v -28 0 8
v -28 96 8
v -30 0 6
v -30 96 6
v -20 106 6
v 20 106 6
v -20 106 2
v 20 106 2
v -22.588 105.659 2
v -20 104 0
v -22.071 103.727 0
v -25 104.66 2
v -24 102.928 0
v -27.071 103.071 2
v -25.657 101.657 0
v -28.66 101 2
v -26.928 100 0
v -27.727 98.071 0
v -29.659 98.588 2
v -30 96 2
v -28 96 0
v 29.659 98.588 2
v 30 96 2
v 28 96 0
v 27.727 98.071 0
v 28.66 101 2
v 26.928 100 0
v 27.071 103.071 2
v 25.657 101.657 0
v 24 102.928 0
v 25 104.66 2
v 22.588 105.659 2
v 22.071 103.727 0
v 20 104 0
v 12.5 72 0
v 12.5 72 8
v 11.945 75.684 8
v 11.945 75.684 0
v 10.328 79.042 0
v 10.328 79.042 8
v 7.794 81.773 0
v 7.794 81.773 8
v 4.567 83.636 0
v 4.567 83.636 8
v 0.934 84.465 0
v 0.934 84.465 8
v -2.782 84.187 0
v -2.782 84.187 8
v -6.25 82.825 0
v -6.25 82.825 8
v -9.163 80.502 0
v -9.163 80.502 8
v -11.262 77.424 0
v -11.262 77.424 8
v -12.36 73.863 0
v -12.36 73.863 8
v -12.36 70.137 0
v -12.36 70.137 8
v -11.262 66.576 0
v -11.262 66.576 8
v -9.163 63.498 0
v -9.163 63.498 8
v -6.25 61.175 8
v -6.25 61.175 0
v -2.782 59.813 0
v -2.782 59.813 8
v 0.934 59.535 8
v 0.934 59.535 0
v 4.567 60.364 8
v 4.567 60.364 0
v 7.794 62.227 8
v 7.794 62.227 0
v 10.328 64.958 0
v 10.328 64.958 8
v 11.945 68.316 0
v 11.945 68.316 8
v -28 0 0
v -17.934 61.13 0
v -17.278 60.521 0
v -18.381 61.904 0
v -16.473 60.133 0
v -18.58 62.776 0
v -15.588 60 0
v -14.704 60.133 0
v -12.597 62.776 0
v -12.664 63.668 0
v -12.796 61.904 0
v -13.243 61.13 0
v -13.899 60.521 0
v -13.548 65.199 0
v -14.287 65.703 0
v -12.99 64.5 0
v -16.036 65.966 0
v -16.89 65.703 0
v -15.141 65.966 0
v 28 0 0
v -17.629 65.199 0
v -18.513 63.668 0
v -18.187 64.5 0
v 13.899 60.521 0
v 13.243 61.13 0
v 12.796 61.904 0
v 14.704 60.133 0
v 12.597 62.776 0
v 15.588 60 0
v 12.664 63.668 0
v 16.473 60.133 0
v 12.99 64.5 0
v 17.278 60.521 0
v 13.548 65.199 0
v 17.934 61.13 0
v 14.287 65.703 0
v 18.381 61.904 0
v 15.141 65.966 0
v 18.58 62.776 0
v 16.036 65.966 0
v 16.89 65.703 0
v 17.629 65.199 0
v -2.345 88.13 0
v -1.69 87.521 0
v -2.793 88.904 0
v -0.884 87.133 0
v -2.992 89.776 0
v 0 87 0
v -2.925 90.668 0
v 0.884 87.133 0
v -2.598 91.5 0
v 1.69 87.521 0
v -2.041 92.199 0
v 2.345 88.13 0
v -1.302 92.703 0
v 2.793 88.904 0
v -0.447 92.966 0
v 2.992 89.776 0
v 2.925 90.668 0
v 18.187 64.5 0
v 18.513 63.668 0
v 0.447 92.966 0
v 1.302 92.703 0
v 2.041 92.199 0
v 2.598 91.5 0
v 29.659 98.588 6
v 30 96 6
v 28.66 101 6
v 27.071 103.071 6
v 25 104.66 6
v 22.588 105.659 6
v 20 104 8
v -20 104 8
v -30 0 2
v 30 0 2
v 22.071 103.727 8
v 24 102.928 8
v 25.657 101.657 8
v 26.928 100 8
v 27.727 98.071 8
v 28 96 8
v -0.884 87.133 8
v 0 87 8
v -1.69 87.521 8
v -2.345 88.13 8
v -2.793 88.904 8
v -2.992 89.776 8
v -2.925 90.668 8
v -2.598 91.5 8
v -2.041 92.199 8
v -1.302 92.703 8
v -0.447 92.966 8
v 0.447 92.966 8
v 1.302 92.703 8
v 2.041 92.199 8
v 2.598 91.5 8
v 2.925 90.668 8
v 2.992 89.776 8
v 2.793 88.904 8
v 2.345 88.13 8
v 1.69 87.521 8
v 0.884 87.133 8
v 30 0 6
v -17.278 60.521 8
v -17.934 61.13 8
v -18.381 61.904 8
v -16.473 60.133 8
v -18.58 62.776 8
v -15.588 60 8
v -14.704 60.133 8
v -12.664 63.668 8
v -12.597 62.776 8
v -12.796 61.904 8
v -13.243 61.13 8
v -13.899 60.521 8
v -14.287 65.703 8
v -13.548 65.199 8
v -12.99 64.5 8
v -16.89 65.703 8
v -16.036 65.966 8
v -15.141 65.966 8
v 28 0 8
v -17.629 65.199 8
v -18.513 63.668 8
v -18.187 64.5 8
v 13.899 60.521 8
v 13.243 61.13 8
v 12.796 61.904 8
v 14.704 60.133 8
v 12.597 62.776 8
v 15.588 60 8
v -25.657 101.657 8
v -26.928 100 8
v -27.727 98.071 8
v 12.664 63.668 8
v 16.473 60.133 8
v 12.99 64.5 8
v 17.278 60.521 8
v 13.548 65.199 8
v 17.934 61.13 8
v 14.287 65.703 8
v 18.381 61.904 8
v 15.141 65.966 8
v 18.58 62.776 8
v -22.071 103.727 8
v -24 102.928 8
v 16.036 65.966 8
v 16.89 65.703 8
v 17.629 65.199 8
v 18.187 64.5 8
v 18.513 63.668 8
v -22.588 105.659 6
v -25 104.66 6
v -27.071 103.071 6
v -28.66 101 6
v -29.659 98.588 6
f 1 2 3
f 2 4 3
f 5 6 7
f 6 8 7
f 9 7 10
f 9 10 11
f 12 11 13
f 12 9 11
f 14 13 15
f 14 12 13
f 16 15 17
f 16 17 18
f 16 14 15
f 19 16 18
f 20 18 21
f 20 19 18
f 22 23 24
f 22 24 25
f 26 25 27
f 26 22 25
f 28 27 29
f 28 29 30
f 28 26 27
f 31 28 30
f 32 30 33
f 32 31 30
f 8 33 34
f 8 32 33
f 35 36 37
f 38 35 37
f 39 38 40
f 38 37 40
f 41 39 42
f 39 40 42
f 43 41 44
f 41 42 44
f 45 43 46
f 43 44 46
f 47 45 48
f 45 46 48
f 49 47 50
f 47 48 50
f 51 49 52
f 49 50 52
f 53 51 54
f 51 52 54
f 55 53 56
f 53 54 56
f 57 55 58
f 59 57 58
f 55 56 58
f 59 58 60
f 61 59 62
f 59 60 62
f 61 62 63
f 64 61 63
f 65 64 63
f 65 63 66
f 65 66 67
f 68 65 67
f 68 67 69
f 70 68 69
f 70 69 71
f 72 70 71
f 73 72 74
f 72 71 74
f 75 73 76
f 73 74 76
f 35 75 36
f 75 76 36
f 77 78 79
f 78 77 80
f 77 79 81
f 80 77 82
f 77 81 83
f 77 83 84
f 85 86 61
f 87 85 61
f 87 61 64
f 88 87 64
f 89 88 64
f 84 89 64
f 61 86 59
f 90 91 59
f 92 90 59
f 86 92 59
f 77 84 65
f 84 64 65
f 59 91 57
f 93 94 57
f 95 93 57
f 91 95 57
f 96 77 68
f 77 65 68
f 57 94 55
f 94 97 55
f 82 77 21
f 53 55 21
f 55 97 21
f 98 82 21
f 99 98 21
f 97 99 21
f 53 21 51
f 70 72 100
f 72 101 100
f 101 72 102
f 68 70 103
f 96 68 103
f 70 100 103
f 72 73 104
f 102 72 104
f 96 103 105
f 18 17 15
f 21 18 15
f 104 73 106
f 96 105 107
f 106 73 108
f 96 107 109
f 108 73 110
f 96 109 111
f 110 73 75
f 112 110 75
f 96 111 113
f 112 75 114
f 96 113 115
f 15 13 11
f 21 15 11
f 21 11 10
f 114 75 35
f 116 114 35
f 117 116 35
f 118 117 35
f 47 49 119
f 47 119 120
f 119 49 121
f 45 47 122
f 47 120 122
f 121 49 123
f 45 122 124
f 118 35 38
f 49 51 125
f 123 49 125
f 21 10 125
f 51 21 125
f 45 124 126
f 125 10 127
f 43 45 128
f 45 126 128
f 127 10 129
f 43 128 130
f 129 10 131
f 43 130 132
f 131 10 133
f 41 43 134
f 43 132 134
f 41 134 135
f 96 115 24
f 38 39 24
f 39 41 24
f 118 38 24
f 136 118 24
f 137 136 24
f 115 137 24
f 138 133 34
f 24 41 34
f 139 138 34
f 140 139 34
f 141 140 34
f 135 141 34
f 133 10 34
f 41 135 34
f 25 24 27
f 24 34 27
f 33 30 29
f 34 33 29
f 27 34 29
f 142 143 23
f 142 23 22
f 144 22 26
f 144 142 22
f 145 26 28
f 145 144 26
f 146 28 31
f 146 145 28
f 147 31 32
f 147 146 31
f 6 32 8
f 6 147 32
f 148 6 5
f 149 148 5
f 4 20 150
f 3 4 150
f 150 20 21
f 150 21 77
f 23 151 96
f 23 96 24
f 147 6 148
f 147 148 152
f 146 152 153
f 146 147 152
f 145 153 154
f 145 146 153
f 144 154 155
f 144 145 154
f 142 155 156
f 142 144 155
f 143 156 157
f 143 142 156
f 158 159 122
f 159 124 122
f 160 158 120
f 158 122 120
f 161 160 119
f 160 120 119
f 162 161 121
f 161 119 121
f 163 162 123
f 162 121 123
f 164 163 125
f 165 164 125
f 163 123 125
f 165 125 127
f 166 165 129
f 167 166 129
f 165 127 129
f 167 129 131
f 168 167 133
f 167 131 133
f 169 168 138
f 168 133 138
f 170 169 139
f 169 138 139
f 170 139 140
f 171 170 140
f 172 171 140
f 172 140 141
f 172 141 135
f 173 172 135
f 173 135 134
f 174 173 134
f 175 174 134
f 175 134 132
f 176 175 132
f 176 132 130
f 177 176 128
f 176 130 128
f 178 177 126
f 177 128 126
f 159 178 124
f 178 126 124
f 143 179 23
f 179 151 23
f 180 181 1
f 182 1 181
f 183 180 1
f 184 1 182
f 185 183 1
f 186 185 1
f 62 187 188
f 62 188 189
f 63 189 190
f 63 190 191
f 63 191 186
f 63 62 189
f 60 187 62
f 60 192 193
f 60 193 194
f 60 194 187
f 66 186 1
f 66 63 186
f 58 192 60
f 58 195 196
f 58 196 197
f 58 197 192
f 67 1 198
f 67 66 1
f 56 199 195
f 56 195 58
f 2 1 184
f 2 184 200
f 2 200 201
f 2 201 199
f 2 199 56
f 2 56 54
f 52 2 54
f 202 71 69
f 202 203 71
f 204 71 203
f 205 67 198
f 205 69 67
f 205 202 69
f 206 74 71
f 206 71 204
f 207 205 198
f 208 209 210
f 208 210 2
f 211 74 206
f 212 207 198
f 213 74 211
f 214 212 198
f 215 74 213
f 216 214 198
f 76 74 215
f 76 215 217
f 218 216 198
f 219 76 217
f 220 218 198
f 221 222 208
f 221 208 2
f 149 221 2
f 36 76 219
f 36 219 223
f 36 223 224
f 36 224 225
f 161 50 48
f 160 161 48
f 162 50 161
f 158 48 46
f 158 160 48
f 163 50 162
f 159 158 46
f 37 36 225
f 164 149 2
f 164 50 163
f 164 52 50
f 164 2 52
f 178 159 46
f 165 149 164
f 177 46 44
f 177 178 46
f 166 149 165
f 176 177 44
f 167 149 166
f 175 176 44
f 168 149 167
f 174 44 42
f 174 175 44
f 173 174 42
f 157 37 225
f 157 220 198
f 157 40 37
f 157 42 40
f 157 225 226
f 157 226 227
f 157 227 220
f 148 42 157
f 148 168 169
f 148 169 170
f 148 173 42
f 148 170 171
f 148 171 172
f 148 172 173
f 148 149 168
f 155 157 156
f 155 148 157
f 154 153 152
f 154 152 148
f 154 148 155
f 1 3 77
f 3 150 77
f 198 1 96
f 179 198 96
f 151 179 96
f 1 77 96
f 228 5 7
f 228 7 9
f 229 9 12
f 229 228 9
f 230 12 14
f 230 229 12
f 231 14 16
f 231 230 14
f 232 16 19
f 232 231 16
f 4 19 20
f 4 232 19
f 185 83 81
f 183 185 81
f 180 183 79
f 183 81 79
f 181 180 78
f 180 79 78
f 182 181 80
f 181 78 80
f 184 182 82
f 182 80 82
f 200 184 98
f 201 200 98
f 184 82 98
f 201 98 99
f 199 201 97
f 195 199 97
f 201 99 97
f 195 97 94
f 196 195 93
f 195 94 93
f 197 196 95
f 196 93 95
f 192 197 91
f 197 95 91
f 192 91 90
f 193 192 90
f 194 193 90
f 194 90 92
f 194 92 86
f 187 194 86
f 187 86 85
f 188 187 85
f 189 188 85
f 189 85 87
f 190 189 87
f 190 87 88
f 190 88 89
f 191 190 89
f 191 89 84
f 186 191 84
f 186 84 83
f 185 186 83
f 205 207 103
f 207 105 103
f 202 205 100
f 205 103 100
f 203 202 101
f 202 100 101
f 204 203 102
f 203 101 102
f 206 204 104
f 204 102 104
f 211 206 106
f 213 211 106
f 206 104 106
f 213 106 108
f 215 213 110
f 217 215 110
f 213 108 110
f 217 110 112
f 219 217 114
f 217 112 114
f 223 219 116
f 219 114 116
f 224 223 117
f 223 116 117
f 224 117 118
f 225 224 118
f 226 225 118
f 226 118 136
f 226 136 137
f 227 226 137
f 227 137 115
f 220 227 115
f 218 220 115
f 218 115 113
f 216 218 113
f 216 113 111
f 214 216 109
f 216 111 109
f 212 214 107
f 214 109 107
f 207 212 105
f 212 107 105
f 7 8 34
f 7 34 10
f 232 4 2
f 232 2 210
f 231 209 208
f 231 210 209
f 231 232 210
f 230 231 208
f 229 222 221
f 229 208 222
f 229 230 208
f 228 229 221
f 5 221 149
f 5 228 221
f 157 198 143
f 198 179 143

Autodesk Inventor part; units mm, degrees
ref_plane "YZ Plane" through (0, 0, 0) normal (1, 0, 0) x (0, 1, 0)
ref_plane "XZ Plane" through (0, 0, 0) normal (0, 1, 0) x (-1, 0, 0)
ref_plane "XY Plane" through (0, 0, 0) normal (0, 0, 1) x (1, 0, 0)
sketch "Sketch1" plane through (0, 0, 0) normal (0, 0, 1) x (1, 0, 0)
  line L0 (-30, 0) -> (30, 0)
  line L1 (30, 0) -> (30, 106)
  line L2 (30, 106) -> (-30, 106)
  line L3 (-30, 106) -> (-30, 0)
  point P0 (0, 0)
  dimension "d0" = 60
  dimension "d1" = 106
  dimension "d2" = 30
extrude "Extrusion1" add sketch "Sketch1" along normal blind 8
fillet "Fillet1" radius 10 2 edges at (30, 106, 4) (-30, 106, 4)
sketch "Sketch2" plane through (0, 0, 8) normal (0, 0, 1) x (1, 0, 0)
  circle A0 centre (0, 72) radius 18
  line L0 (0, 72) -> (-15.5885, 63)
  line L1 (0, 72) -> (0, 90)
  line L2 (0, 72) -> (15.5885, 63)
  point P0 (0, 0)
  point P1 (0, 90)
  point P2 (-15.5885, 63)
  point P3 (15.5885, 63)
  dimension "d6" = 36
  dimension "d7" = 120
  dimension "d8" = 120
  dimension "d9" = 0
  dimension "d10" = 72
hole "Hole1" at (0, 90, 8) at (-15.5885, 63, 8) at (15.5885, 63, 8) direction (0, 0, -1) diameter 6 end through all
sketch "Sketch3" plane through (0, 0, 8) normal (0, 0, 1) x (1, 0, 0)
  circle A0 centre (0, 72) radius 12.5
  line L0 (-30, 0) -> (30, 0) projected
  point P0 (0, 0)
  dimension "d18" = 72
  dimension "d19" = 0
  dimension "d20" = 25
extrude "Extrusion2" cut sketch "Sketch3" against normal through all
chamfer "Chamfer1" distance 2 angle 45 10 edges at (0, 106, 8) (-27.0711, 103.0711, 8) (-30, 48, 8) (27.0711, 103.0711, 8) (30, 48, 8) (0, 106, 0) (-27.0711, 103.0711, 0) (-30, 48, 0) (27.0711, 103.0711, 0) (30, 48, 0)
equation "\"d2\" = 0.5 * d0"
equation "\"d10\" = centreHeight + heightClearance"
equation "\"d18\" = centreHeight + heightClearance"
equation "\"centreHeight\" = 66"
equation "\"heightClearance\" = 6"
properties part number "motorHolder_rotor" material "Steel, Mild"
